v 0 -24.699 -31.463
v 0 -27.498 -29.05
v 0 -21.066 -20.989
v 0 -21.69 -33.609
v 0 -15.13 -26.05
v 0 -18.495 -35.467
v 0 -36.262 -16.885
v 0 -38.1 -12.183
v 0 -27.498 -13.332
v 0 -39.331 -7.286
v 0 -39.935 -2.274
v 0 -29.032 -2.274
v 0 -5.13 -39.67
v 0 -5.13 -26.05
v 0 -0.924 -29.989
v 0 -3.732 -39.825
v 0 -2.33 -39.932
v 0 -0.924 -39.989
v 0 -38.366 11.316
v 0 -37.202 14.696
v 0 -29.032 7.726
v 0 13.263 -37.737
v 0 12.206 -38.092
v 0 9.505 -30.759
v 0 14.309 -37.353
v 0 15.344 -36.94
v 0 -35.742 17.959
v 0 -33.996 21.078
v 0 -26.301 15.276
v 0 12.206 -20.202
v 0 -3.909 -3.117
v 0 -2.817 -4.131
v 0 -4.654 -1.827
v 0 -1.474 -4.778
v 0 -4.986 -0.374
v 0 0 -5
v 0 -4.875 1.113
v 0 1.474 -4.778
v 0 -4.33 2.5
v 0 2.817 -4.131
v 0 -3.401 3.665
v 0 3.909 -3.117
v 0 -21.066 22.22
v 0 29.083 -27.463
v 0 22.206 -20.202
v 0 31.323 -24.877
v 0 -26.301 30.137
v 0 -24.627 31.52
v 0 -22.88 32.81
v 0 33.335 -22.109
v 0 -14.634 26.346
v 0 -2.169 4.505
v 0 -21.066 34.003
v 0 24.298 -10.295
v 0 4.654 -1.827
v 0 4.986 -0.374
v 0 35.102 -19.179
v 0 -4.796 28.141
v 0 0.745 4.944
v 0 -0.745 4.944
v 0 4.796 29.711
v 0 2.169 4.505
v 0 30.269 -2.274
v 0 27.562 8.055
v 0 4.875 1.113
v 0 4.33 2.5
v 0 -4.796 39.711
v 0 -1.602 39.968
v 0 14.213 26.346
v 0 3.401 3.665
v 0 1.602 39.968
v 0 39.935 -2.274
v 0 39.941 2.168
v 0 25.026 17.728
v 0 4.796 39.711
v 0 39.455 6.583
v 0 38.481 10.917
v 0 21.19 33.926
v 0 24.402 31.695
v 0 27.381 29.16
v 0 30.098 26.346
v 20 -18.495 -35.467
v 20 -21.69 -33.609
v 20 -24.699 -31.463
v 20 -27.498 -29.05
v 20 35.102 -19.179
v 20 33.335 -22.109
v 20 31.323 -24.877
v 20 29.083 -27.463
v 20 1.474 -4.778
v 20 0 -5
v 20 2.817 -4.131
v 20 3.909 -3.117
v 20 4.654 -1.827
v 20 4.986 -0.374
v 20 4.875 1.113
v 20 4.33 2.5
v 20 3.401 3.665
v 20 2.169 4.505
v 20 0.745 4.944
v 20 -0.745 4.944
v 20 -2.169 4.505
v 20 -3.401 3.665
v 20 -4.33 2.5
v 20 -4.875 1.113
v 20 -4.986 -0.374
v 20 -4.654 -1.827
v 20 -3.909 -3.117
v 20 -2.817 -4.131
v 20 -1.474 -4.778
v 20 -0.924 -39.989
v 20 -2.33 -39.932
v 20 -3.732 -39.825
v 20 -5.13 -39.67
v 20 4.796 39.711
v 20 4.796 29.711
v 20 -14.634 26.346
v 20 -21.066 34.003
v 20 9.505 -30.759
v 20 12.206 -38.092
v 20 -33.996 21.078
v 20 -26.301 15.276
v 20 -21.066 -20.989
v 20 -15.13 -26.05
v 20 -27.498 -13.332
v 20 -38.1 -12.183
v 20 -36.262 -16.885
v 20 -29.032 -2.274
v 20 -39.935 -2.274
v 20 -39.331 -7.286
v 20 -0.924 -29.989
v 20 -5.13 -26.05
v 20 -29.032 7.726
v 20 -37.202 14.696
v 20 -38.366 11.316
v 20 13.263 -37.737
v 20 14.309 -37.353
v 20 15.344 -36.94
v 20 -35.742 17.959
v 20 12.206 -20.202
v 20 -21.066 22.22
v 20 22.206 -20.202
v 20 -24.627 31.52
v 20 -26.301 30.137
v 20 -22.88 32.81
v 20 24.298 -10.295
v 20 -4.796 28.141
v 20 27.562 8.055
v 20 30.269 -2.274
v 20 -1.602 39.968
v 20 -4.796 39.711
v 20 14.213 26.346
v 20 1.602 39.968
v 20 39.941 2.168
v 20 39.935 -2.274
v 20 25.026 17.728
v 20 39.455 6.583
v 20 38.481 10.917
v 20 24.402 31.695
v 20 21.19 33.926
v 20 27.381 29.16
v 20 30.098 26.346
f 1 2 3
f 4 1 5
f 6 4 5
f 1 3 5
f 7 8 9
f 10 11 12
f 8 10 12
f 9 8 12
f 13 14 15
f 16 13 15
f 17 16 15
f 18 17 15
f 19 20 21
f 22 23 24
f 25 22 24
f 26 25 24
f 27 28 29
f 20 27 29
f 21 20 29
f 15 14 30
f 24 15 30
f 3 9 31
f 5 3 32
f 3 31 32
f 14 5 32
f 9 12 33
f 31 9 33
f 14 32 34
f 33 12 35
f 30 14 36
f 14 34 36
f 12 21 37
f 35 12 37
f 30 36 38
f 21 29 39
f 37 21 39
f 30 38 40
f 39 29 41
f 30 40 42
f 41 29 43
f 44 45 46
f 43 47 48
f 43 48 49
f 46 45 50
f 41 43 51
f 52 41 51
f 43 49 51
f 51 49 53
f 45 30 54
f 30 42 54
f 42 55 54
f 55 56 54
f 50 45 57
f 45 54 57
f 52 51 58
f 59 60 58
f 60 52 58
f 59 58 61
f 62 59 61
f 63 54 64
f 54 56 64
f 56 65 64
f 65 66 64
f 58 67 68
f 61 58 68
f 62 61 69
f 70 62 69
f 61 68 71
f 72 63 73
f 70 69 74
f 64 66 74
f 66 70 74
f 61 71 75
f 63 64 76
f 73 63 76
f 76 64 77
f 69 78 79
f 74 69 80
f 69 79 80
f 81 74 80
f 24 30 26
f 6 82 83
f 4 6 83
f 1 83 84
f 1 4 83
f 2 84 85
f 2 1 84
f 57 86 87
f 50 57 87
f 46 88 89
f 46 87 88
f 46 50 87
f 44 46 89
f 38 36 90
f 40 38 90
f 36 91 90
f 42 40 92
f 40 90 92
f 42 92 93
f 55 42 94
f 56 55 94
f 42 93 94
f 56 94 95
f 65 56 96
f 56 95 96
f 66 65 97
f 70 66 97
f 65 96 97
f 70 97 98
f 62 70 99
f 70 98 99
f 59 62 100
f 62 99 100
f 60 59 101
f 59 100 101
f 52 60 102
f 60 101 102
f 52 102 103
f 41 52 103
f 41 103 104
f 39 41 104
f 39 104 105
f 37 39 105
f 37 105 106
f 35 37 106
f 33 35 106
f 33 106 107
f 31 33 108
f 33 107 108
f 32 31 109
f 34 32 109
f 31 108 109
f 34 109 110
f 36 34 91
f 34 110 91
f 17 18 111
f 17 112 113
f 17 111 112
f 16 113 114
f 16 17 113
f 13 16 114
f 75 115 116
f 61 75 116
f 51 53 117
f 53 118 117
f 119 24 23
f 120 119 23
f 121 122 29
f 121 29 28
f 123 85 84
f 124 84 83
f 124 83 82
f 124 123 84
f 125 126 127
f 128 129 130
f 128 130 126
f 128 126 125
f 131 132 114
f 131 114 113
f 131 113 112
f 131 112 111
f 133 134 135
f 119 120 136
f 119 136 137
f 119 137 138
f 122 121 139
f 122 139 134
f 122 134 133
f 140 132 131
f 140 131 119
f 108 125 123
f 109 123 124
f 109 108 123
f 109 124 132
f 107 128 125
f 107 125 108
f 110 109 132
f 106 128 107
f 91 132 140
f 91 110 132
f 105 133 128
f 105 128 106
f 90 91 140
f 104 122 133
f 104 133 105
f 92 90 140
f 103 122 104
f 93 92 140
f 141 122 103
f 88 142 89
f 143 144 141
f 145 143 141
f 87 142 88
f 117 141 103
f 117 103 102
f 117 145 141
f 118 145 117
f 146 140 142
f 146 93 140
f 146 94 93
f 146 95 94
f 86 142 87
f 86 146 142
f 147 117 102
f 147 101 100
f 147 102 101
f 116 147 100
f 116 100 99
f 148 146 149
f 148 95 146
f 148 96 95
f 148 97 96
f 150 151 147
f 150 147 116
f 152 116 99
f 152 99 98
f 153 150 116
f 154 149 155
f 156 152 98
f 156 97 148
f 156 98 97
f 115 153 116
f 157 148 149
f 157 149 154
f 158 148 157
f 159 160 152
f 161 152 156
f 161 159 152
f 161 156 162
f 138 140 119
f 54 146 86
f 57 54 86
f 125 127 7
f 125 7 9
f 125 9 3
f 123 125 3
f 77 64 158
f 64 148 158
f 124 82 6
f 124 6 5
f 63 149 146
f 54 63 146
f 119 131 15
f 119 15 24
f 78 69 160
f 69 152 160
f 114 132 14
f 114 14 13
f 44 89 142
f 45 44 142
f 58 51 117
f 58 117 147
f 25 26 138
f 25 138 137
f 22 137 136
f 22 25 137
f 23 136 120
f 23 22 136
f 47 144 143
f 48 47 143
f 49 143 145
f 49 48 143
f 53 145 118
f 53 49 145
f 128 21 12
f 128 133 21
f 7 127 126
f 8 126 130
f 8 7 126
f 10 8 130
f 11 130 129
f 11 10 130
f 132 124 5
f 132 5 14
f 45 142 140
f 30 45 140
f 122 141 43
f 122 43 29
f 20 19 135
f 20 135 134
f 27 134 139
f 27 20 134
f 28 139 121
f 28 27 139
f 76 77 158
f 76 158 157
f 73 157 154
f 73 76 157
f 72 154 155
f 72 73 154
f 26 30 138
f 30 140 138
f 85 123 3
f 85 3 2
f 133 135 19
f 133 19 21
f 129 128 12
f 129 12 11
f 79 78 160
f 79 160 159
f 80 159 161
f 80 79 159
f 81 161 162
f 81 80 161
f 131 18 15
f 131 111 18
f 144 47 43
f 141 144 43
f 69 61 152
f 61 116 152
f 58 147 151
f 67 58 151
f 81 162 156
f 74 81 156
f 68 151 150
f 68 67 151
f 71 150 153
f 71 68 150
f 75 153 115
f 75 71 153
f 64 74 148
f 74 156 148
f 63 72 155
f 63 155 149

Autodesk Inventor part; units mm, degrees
ref_plane "YZ Plane" through (0, 0, 0) normal (1, 0, 0) x (0, 1, 0)
ref_plane "XZ Plane" through (0, 0, 0) normal (0, 1, 0) x (-1, 0, 0)
ref_plane "XY Plane" through (0, 0, 0) normal (0, 0, 1) x (1, 0, 0)
sketch "Sketch1" plane through (0, 0, 0) normal (1, 0, 0) x (0, 1, 0)
  circle A0 centre (0, 0) radius 40
  dimension "d0" = 80
extrude "Extrusion1" add sketch "Sketch1" along normal blind 20
sketch "Sketch2" plane through (20, 0, 0) normal (1, 0, 0) x (0, 0, -1)
  circle A0 centre (0, 0) radius 40 projected
  line L0 (-11.3165, -38.3658) -> (-7.7264, -29.0325)
  line L1 (-7.7264, -29.0325) -> (2.2736, -29.0325)
  line L2 (2.2736, -29.0325) -> (2.2736, -39.9353)
  line L3 (16.8851, -36.2615) -> (13.3323, -27.4978)
  line L4 (13.3323, -27.4978) -> (20.9893, -21.0659)
  line L5 (20.9893, -21.0659) -> (29.0495, -27.4978)
  line L6 (-34.0034, -21.0659) -> (-26.3463, -14.6339)
  line L7 (-26.3463, -14.6339) -> (-28.141, -4.7963)
  line L8 (-28.141, -4.7963) -> (-39.7114, -4.7963)
  line L9 (-39.7114, 4.7963) -> (-29.7114, 4.7963)
  line L10 (-29.7114, 4.7963) -> (-26.3463, 14.2131)
  line L11 (-26.3463, 14.2131) -> (-33.9262, 21.1899)
  line L12 (35.4673, -18.4951) -> (26.0505, -15.1301)
  line L13 (26.0505, -15.1301) -> (26.0505, -5.1301)
  line L14 (26.0505, -5.1301) -> (39.6697, -5.1301)
  line L15 (-26.3463, 30.0977) -> (-17.7279, 25.026)
  line L16 (-17.7279, 25.026) -> (-8.0547, 27.5618)
  line L17 (-8.0547, 27.5618) -> (-10.9173, 38.4813)
  line L18 (2.2736, 39.9353) -> (2.2736, 30.2694)
  line L19 (2.2736, 30.2694) -> (10.2947, 24.2977)
  line L20 (10.2947, 24.2977) -> (19.1787, 35.1024)
  line L21 (27.4627, 29.0827) -> (20.2021, 22.2063)
  line L22 (20.2021, 22.2063) -> (20.2021, 12.2063)
  line L23 (20.2021, 12.2063) -> (36.9402, 15.3435)
  line L24 (39.9893, -0.9244) -> (29.9893, -0.9244)
  line L25 (29.9893, -0.9244) -> (30.7589, 9.5047)
  line L26 (30.7589, 9.5047) -> (38.0921, 12.2063)
  dimension "d3" = 10
  dimension "d4" = 10
  dimension "d5" = 10
  dimension "d6" = 10
  dimension "d7" = 10
  dimension "d8" = 10
  dimension "d9" = 10
  dimension "d10" = 10
  dimension "d11" = 10
  dimension "d12" = 10
  dimension "d13" = 10
  dimension "d14" = 10
  dimension "d15" = 10
  dimension "d16" = 10
  dimension "d17" = 10
extrude "Extrusion2" cut sketch "Sketch2" against normal blind 20 contours A0 L24 L25 L26 | L23 L22 L21 A0 | A0 L12 L13 L14 | L20 L19 L18 A0 | A0 L3 L4 L5 | L17 L16 L15 A0 | A0 L0 L1 L2 | L11 L10 L9 A0 | A0 L8 L7 L6
sketch "Sketch3" plane through (20, 0, 0) normal (1, 0, 0) x (0, 0, -1)
  arc A0 (-34.0034, -21.0659) -> (-11.3165, -38.3658) centre (0, 0) ccw projected
  line L0 (-30.137, -26.3014) -> (-22.2204, -21.0659)
  line L1 (-22.2204, -21.0659) -> (-15.2765, -26.3014)
  line L2 (-15.2765, -26.3014) -> (-21.078, -33.9959)
extrude "Extrusion3" cut sketch "Sketch3" against normal blind 20
sketch "Sketch4" plane through (20, 0, 0) normal (1, 0, 0) x (0, 0, -1)
  circle A0 centre (0, 0) radius 5
  dimension "d22" = 10
extrude "Extrusion4" cut sketch "Sketch4" against normal blind 20
properties part number "pinion"
